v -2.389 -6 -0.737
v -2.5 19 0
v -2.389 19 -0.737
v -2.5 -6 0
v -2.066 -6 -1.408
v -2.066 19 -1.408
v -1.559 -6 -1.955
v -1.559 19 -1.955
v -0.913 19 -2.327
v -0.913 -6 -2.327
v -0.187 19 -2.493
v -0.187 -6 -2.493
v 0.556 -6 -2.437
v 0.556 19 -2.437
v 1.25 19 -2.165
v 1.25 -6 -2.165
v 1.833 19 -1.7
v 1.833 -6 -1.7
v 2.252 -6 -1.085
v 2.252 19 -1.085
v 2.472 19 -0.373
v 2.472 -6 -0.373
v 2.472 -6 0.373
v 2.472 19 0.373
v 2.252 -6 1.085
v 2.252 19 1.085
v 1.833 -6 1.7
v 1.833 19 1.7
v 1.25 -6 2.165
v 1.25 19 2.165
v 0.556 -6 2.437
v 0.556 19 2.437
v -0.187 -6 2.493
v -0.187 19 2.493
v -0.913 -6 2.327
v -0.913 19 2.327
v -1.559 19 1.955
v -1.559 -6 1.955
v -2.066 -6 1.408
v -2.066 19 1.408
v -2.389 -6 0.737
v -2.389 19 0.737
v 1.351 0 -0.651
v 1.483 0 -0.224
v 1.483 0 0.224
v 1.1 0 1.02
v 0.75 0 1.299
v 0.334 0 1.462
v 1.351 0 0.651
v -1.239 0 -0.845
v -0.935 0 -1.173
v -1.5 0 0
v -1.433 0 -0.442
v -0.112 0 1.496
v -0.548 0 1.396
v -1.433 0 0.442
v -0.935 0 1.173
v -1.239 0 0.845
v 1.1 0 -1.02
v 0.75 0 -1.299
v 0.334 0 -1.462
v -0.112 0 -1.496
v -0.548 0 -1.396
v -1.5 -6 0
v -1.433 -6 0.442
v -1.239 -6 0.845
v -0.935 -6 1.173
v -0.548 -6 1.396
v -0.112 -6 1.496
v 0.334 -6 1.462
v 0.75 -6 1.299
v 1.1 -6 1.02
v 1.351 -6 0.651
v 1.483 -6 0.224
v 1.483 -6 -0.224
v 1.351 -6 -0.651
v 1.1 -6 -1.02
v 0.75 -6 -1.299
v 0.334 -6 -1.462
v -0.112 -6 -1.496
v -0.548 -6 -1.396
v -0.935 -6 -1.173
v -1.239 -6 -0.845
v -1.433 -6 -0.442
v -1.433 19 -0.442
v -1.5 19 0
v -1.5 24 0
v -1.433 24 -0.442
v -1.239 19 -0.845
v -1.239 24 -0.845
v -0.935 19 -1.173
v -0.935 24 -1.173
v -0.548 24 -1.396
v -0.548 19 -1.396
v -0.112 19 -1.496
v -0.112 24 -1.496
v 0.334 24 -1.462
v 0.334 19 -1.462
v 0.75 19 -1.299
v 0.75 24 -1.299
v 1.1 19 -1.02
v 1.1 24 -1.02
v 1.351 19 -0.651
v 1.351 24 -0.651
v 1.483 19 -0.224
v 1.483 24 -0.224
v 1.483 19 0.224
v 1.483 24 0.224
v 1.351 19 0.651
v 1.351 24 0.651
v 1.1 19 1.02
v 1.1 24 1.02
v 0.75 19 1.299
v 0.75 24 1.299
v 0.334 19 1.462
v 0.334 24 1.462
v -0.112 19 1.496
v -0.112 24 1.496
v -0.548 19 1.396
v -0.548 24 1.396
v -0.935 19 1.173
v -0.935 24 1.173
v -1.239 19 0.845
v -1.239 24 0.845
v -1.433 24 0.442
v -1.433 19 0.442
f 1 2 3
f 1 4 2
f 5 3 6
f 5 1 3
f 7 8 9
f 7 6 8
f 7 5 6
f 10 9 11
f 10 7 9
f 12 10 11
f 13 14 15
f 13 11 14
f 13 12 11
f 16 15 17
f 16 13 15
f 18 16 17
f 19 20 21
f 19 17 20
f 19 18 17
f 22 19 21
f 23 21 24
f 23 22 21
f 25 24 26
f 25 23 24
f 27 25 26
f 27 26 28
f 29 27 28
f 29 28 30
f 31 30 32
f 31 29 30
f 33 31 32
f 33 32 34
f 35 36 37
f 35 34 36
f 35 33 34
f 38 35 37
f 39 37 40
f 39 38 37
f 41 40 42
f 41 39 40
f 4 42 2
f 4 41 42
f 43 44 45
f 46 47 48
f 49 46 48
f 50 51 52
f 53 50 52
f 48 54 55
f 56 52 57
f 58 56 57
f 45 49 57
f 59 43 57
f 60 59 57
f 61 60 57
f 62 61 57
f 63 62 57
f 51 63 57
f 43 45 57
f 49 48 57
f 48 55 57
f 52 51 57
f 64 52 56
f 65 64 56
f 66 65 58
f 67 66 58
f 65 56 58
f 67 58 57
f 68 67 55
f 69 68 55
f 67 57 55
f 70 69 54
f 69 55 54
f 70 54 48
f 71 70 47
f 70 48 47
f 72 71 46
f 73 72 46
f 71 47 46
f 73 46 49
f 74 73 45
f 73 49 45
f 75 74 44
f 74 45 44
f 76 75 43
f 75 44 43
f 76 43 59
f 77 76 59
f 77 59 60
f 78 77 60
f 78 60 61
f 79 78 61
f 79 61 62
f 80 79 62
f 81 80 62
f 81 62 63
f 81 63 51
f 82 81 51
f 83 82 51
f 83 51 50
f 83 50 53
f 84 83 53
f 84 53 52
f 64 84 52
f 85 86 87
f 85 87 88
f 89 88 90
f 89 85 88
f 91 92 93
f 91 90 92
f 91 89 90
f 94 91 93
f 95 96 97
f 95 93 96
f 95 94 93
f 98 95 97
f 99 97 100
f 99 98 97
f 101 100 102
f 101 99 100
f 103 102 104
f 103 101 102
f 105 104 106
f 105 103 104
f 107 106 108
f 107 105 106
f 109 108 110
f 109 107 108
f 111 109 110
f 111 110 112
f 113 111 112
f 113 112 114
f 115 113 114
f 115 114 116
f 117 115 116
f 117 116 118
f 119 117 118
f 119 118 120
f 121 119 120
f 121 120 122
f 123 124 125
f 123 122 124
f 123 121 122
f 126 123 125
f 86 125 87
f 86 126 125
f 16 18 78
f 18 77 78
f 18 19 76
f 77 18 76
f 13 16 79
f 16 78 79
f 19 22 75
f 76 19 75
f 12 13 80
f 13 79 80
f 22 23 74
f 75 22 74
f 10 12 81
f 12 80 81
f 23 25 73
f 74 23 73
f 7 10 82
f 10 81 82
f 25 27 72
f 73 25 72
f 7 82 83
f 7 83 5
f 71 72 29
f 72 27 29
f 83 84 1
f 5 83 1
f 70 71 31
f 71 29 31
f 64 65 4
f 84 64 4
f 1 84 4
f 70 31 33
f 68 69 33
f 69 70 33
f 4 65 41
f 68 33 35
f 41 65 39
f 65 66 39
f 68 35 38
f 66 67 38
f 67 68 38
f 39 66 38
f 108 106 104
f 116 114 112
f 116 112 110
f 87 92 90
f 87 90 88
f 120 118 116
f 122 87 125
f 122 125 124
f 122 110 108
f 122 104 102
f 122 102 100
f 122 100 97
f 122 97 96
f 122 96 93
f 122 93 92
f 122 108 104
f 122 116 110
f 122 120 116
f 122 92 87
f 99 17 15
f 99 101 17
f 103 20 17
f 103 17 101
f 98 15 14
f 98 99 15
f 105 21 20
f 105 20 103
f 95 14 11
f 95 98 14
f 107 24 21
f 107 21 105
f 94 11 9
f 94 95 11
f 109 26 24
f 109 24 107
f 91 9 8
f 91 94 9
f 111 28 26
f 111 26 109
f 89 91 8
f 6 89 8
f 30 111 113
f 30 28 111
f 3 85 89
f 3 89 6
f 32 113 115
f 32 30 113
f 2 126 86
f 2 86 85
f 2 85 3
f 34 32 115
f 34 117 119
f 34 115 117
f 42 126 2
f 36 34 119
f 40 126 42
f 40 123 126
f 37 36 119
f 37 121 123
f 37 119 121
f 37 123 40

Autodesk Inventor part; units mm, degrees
ref_plane "YZ Plane" through (0, 0, 0) normal (1, 0, 0) x (0, 1, 0)
ref_plane "XZ Plane" through (0, 0, 0) normal (0, 1, 0) x (-1, 0, 0)
ref_plane "XY Plane" through (0, 0, 0) normal (0, 0, 1) x (1, 0, 0)
sketch "Sketch1" plane through (0, 0, 0) normal (0, 0, 1) x (1, 0, 0)
  line L0 (0, 24) -> (-1.5, 24)
  line L1 (-1.5, 24) -> (-1.5, 19)
  line L2 (-1.5, 19) -> (-2.5, 19)
  line L3 (-2.5, 19) -> (-2.5, -6)
  line L4 (-2.5, -6) -> (-1.5, -6)
  line L5 (-1.5, -6) -> (-1.5, 0)
  line L6 (-1.5, 0) -> (0, 0)
  line L7 (0, 0) -> (0, 24)
  dimension "d0" = 1.5
  dimension "d2" = 2.5
  dimension "d4" = 5
  dimension "d5" = 25
  dimension "d9" = 6
revolve "Revolution1" add sketch "Sketch1" angle 360 about axis through (0, 0, 0) along (0, 1, 0)
thread "Thread1" size "M3x0.5" class "6g" standard "ANSI Metric M Profile" full length
thread "Thread2" size "M3x0.5" class "6H" standard "ANSI Metric M Profile" full length
properties part number "Fitting-3" material "Brass"
